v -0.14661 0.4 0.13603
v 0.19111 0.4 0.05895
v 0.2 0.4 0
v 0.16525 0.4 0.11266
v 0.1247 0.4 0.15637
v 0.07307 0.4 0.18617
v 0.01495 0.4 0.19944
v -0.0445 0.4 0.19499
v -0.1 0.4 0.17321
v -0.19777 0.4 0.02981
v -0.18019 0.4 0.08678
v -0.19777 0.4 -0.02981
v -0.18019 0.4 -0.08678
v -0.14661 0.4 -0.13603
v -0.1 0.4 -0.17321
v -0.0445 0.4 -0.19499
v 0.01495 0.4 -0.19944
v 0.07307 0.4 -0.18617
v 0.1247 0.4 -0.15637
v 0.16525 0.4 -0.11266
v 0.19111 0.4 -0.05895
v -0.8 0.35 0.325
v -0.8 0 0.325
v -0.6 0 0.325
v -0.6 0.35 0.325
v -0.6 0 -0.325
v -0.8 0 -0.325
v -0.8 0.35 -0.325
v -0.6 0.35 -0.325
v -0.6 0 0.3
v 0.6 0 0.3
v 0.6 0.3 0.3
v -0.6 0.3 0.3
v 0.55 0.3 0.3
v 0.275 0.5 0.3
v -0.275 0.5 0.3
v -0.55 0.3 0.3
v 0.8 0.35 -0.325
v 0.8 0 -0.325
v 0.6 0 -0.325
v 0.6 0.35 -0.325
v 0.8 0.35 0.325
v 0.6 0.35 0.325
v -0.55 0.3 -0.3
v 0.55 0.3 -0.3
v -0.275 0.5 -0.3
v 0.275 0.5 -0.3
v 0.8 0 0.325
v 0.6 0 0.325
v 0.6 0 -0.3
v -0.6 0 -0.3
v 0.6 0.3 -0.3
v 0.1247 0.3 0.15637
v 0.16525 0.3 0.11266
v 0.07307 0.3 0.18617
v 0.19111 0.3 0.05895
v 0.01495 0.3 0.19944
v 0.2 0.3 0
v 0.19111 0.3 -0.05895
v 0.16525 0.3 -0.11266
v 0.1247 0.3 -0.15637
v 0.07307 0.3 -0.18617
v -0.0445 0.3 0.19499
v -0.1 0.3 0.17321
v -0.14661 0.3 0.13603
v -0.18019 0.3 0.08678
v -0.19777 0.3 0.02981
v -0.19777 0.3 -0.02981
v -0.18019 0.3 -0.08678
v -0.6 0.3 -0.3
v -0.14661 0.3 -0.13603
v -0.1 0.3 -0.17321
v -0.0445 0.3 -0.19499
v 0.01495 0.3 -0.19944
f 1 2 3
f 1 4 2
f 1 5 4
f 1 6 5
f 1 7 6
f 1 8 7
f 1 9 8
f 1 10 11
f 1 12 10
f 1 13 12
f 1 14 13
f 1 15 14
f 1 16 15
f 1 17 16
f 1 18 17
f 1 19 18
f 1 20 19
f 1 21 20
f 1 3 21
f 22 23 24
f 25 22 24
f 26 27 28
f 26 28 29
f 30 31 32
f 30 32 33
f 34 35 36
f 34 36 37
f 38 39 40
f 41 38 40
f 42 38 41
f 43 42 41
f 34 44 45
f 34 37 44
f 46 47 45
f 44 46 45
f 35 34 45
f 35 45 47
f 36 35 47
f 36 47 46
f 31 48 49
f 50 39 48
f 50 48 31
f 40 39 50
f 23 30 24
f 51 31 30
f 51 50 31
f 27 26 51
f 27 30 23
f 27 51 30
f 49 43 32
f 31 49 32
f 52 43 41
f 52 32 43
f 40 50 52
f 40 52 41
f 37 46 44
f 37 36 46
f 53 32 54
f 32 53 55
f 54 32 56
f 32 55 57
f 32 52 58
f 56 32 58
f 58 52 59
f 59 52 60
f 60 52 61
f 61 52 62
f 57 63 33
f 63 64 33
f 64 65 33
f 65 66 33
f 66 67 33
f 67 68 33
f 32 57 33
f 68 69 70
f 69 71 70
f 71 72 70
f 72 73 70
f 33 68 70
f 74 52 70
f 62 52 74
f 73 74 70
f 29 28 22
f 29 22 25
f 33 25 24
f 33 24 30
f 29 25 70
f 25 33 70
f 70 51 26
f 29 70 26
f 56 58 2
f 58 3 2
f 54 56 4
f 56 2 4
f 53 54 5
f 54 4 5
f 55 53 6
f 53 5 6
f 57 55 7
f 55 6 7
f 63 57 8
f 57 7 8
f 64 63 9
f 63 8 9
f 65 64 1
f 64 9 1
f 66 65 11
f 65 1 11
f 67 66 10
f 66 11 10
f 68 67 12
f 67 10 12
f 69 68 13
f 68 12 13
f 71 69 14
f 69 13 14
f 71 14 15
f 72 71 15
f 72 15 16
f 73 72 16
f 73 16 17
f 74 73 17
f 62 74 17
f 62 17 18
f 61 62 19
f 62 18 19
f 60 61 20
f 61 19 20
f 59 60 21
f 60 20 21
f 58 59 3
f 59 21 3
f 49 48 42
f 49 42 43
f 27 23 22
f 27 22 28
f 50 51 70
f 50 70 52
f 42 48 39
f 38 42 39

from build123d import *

# Parameters (mm, degrees)
BOSS_EXTRUDE1_DEPTH = 0.3
SKETCH3_W           = 0.2
SKETCH3_H           = 0.1
SKETCH4_W           = 0.2
SKETCH4_H           = 0.65
BOSS_EXTRUDE4_DEPTH = 0.35
BOSS_EXTRUDE5_DEPTH = 0.3


with BuildPart() as part:
    # Sketch1 → Boss-Extrude1 (new body)
    with BuildSketch(Plane(origin=(0, 0, 0), x_dir=(1, 0, 0), z_dir=(0, 1, 0))):
        with BuildLine():
            Line((-0.75, 0.3), (0.75, 0.3))
            Line((0.75, 0.3), (0.75, 0.125))
            ThreePointArc((0.75, 0.125), (0.625, 0), (0.75, -0.125))
            Line((0.75, -0.125), (0.75, -0.3))
            Line((0.75, -0.3), (-0.75, -0.3))
            Line((-0.75, -0.3), (-0.75, -0.125))
            ThreePointArc((-0.75, -0.125), (-0.625, 0), (-0.75, 0.125))
            Line((-0.75, 0.125), (-0.75, 0.3))
        make_face()
    extrude(amount=BOSS_EXTRUDE1_DEPTH)

    # Sketch3 → Revolve1 (revolve)
    with BuildSketch(Plane.XY):
        with Locations((0.1, 0.35)):
            Rectangle(SKETCH3_W, SKETCH3_H)
    revolve(axis=Axis((0, 0.809216282, 0), (0, -1, 0)))

    # Sketch4 → Boss-Extrude4 (add)
    with BuildSketch(Plane(origin=(0, 0, 0), x_dir=(1, 0, 0), z_dir=(0, 1, 0))):
        with Locations((-0.7, 0)):
            Rectangle(SKETCH4_W, SKETCH4_H)
    boss_extrude4 = extrude(amount=BOSS_EXTRUDE4_DEPTH)

    # Symétrie1: Boss-Extrude4 across plane
    add(boss_extrude4.mirror(Plane(origin=(0, 0, 0), x_dir=(0, 0, 1), z_dir=(1, 0, 0))))


with BuildPart() as body_2:
    # Sketch2 → Boss-Extrude5 (new body, symmetric)
    with BuildSketch(Plane.XY):
        Polygon((-0.55, 0.3), (0.55, 0.3), (0.275, 0.5), (-0.275, 0.5), align=None)
    extrude(amount=BOSS_EXTRUDE5_DEPTH, both=True)


solid = Compound([part.part, body_2.part])
